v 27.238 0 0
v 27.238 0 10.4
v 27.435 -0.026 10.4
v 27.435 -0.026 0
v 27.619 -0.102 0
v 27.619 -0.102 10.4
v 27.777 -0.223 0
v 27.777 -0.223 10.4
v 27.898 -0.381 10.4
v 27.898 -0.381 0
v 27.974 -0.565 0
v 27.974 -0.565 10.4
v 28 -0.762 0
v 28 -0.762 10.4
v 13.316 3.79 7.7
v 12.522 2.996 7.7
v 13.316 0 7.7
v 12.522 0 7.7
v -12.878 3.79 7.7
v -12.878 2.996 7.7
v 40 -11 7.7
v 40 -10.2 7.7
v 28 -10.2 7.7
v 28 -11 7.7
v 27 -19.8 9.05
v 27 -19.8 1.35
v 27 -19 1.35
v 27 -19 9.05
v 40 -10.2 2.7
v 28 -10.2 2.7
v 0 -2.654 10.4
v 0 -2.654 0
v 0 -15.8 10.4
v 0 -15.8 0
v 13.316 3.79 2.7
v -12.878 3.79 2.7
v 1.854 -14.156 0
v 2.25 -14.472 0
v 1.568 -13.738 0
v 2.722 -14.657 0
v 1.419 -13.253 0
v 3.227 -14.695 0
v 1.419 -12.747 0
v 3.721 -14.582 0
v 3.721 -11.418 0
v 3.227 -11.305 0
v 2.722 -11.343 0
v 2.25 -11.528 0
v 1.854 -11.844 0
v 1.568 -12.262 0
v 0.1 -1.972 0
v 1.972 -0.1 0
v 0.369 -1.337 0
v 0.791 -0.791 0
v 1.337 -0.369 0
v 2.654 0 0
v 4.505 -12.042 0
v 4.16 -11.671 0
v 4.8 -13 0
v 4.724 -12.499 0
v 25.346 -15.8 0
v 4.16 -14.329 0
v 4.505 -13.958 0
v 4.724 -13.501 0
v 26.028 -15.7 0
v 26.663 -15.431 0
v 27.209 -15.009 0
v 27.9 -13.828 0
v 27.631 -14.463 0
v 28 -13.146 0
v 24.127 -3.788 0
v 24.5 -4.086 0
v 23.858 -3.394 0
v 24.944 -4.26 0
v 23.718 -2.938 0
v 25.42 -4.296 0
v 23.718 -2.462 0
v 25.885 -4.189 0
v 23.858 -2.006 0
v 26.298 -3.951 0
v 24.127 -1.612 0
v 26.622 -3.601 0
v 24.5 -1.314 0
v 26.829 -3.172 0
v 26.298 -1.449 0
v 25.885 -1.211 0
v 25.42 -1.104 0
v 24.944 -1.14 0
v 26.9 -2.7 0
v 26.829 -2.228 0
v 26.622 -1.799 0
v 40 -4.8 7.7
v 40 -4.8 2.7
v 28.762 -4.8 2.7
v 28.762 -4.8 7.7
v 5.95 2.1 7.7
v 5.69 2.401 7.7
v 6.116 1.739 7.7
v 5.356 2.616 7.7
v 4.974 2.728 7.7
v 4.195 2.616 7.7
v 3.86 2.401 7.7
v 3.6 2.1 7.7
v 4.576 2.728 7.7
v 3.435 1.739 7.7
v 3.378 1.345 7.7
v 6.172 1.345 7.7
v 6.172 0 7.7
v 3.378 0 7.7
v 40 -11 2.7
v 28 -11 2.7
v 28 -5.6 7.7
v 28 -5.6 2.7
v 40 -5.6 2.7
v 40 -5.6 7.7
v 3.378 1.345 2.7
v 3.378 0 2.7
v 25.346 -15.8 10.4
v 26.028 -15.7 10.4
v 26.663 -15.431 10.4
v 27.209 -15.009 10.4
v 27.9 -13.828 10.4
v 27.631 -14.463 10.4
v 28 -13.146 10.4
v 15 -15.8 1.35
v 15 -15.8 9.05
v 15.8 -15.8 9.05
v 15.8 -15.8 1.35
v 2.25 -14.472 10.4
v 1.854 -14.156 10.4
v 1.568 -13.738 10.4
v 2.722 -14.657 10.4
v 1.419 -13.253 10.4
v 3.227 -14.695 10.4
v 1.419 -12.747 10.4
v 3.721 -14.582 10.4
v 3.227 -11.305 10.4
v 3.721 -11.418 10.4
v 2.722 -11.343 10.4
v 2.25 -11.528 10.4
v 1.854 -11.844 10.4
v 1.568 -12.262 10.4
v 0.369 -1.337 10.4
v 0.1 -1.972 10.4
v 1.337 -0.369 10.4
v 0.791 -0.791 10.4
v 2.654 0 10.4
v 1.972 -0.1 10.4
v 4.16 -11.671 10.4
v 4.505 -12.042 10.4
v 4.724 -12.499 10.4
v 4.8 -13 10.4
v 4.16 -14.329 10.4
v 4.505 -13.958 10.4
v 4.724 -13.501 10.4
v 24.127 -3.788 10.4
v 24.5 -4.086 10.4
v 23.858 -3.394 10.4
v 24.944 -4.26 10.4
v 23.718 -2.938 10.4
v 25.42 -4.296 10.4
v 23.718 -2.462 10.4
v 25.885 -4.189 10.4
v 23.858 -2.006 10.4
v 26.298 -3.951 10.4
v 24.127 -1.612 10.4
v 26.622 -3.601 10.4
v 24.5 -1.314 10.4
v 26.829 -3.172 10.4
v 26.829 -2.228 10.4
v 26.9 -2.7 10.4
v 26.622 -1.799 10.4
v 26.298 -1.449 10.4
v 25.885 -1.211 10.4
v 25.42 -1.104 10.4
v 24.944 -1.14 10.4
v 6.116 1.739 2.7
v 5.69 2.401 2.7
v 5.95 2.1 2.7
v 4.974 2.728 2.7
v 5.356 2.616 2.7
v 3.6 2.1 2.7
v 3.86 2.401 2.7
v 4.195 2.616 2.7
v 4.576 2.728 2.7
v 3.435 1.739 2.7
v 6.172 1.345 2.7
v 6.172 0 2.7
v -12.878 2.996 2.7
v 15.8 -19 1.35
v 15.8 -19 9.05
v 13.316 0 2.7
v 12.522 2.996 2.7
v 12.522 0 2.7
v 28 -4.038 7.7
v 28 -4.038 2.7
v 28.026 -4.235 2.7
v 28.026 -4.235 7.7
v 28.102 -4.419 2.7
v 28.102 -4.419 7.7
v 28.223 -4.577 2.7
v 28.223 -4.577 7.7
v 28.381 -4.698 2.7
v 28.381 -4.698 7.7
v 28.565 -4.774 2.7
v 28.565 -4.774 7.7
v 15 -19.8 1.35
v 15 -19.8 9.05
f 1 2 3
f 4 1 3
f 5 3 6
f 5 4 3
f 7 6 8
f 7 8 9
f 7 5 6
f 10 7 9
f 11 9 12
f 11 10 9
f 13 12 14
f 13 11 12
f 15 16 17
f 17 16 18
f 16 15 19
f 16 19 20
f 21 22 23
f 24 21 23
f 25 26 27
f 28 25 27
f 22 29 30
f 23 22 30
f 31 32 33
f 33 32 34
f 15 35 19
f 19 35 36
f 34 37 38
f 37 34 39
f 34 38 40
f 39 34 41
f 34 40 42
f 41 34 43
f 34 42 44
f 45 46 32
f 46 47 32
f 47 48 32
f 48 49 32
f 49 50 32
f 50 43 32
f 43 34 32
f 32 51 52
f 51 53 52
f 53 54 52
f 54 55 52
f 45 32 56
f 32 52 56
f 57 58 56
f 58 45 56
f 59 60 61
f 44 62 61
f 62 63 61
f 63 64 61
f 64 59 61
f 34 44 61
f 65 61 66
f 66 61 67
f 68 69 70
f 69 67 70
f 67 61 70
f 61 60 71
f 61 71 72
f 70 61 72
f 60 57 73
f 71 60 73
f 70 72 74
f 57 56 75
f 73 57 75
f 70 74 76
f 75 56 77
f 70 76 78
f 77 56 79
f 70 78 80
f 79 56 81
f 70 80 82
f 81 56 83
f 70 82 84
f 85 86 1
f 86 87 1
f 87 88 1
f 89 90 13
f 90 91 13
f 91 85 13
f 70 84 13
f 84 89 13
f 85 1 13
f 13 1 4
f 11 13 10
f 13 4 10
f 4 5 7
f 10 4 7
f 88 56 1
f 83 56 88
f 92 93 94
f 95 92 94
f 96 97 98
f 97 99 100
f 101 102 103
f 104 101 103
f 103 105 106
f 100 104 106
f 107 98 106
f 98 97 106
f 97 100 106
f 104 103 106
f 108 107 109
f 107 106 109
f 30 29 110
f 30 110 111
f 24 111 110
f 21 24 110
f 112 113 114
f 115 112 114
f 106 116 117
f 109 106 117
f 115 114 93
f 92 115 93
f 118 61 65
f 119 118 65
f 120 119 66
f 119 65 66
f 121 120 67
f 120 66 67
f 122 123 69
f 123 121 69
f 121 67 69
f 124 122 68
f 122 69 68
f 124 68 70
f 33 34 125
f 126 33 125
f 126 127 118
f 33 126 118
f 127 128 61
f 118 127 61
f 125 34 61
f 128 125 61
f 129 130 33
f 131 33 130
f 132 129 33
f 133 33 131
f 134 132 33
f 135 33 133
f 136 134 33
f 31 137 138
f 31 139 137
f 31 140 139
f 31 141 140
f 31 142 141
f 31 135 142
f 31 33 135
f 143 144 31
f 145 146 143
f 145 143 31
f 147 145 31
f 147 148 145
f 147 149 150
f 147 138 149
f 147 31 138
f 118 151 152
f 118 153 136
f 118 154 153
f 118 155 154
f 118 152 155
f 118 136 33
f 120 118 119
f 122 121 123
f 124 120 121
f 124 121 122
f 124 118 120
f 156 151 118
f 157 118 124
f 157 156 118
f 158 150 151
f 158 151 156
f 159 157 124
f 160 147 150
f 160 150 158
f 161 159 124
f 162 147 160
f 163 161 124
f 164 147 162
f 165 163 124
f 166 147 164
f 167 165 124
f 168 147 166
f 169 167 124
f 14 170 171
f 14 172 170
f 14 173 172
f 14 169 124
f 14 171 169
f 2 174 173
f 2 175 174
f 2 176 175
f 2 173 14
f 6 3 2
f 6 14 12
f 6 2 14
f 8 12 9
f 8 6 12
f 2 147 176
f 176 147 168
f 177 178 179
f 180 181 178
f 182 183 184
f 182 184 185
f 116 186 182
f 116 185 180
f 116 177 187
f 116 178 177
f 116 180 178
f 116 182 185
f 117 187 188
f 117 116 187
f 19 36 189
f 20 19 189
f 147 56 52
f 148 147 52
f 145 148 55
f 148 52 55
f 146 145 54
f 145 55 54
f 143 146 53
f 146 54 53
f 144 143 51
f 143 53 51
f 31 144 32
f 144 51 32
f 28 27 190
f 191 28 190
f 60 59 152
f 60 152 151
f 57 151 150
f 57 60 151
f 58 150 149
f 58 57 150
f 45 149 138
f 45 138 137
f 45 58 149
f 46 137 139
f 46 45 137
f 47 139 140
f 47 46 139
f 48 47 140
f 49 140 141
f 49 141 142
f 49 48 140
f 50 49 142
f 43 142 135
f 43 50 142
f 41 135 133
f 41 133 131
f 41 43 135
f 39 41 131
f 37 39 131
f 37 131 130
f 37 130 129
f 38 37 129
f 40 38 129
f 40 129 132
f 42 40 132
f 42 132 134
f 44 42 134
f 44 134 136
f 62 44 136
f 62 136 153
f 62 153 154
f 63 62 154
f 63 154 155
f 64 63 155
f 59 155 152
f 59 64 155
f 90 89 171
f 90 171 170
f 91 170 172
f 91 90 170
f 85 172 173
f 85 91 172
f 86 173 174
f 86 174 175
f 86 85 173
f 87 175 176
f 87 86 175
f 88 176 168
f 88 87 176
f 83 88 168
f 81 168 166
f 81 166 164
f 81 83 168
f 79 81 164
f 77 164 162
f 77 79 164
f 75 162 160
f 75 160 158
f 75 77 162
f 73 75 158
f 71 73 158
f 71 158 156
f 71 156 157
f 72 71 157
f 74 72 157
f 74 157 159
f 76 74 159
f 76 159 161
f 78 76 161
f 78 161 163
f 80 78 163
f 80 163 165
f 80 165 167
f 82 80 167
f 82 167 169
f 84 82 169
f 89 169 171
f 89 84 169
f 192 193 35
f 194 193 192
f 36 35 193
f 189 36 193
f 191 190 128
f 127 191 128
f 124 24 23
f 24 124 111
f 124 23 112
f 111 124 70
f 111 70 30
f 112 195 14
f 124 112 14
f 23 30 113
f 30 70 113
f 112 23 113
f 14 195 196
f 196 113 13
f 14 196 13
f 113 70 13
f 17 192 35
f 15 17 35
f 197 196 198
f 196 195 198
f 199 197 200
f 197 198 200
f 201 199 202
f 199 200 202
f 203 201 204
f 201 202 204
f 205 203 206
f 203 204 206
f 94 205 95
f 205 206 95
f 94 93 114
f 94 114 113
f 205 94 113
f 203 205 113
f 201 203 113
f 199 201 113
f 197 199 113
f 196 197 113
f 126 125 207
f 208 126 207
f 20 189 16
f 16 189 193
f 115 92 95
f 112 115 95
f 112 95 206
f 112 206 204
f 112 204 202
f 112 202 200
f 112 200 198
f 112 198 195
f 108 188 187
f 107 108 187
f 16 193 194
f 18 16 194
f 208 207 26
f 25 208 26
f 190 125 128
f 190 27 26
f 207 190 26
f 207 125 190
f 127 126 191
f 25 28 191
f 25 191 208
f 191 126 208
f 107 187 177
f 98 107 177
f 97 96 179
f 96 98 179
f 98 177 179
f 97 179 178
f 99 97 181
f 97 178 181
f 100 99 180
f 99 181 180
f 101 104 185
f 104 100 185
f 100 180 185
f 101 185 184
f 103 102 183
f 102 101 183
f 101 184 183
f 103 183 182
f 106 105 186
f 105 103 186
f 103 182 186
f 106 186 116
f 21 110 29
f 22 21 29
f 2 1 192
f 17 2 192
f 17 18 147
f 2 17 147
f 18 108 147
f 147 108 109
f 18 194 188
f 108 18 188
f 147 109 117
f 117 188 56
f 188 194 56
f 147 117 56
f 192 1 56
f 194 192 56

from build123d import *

# Parameters (mm, degrees)
F0_R          = 1.7
F0_R_2        = 1.6
F1_DEPTH      = 10.4
F2_W          = 12.7
F2_H          = 2.7
F2_W_2        = 4
F2_H_2        = 1.35
F3_DEPTH      = 28
F3_DEPTH_BACK = 12.8778
F4_W          = 12
F4_H          = 2.7
F5_DEPTH      = 6.2
F6_T1_DEPTH   = 23.9048285752
F7_R          = 0.762


# Not quite as in the source:
# - a fillet or chamfer that OpenCascade refuses, or shapes differently, is made with other operations: its cross-section is extruded or revolved along the edge and cut away or added
# - a feature names something its author has since deleted; it is built from what else it names


with BuildPart() as f1:
    # F0 (on Top) → F1 (new body)
    with BuildSketch(Plane.XY):
        with BuildLine():
            Line((3.3782, 0), (0, 0))
            Line((0, 0), (0, -15.8))
            Line((0, -15.8), (15, -15.8))
            Line((15, -15.8), (15, -19.8))
            Line((15, -19.8), (27, -19.8))
            Line((27, -19.8), (27, -19))
            Line((27, -19), (15.8, -19))
            Line((15.8, -19), (15.8, -15.8))
            Line((15.8, -15.8), (28, -15.8))
            Line((28, -15.8), (28, -11))
            Line((28, -11), (40, -11))
            Line((40, -11), (40, -10.2))
            Line((40, -10.2), (28, -10.2))
            Line((28, -10.2), (28, -5.6))
            Line((28, -5.6), (40, -5.6))
            Line((40, -5.6), (40, -4.8))
            Line((40, -4.8), (28, -4.8))
            Line((28, -4.8), (28, 0))
            Line((28, 0), (13.31595, 0))
            Line((13.31595, 0), (13.31595, 3.78975))
            Line((13.31595, 3.78975), (-12.8778, 3.78975))
            Line((-12.8778, 3.78975), (-12.8778, 2.996))
            Line((-12.8778, 2.996), (12.5222, 2.996))
            Line((12.5222, 2.996), (12.5222, 0))
            Line((12.5222, 0), (6.1722, 0))
            Line((6.1722, 0), (6.1722, 1.345))
            ThreePointArc((6.1722, 1.345), (4.7752, 2.742), (3.3782, 1.345))
            Line((3.3782, 1.345), (3.3782, 0))
        make_face()
        with Locations((3.1, -13)):
            Circle(F0_R, mode=Mode.SUBTRACT)
        with Locations((25.3, -2.7)):
            Circle(F0_R_2, mode=Mode.SUBTRACT)
    extrude(amount=F1_DEPTH)

    # F2 (on face) → F3 (cut, two sides)
    with BuildSketch(Plane(origin=(0, 0, 0), x_dir=(0, -1, 0), z_dir=(-1, 0, 0))) as f3_sk:
        with Locations((-6.35, 9.05)):
            Rectangle(F2_W, F2_H)
        with Locations((-6.35, 1.35)):
            Rectangle(F2_W, F2_H)
        with Locations((17.8, 9.725)):
            Rectangle(F2_W_2, F2_H_2)
        with Locations((17.8, 0.675)):
            Rectangle(F2_W_2, F2_H_2)
    extrude(amount=-F3_DEPTH, mode=Mode.SUBTRACT)
    extrude(f3_sk.sketch, amount=F3_DEPTH_BACK, mode=Mode.SUBTRACT)

    # F4 (on face) → F5 (cut, through all)
    with BuildSketch(Plane(origin=(0, -4.8, 0), x_dir=(-1, 0, 0), z_dir=(0, 1, 0))):
        with Locations((-34, 9.05)):
            Rectangle(F4_W, F4_H)
        with Locations((-34, 1.35)):
            Rectangle(F4_W, F4_H)
    extrude(amount=-F5_DEPTH, mode=Mode.SUBTRACT)

    # F6: fillet of radius 2.7 on 3 edges, made by hand

    # F6_s2 → F6_t1 (cut)
    with BuildSketch(Plane.XY.offset(-6.7524142876)):
        with BuildLine():
            ThreePointArc((25.2990343146, -15.8004), (27.2091883092, -15.0091883092), (28.0004, -13.0990343146))
            Line((28.0004, -13.0990343146), (28.2705365685, -13.0990343146))
            ThreePointArc((28.2705365685, -13.0990343146), (28.2701365685, -14.4495171573), (28.2701365685, -15.8))
            Line((28.2701365685, -15.8), (28, -16.0701365685))
            ThreePointArc((28, -16.0701365685), (26.6495171573, -16.0701365685), (25.2990343146, -16.0705365685))
            Line((25.2990343146, -16.0705365685), (25.2990343146, -15.8004))
        make_face()
        with BuildLine():
            ThreePointArc((2.7009656854, 0.0004), (0.7908116908, -0.7908116908), (-0.0004, -2.7009656854))
            Line((-0.0004, -2.7009656854), (-0.2705365685, -2.7009656854))
            ThreePointArc((-0.2705365685, -2.7009656854), (-0.2701365685, -1.3504828427), (-0.2701365685, 0))
            Line((-0.2701365685, 0), (0, 0.2701365685))
            ThreePointArc((0, 0.2701365685), (1.3504828427, 0.2701365685), (2.7009656854, 0.2705365685))
            Line((2.7009656854, 0.2705365685), (2.7009656854, 0.0004))
        make_face()
    extrude(amount=F6_T1_DEPTH, mode=Mode.SUBTRACT)

    # F7
    f7_edges = [f1.edges().sort_by_distance(p)[0] for p in [
        (28, 0, 5.2),
        (28, -4.8, 5.2),
    ]]
    fillet(f7_edges, radius=F7_R)


solid = f1.part
